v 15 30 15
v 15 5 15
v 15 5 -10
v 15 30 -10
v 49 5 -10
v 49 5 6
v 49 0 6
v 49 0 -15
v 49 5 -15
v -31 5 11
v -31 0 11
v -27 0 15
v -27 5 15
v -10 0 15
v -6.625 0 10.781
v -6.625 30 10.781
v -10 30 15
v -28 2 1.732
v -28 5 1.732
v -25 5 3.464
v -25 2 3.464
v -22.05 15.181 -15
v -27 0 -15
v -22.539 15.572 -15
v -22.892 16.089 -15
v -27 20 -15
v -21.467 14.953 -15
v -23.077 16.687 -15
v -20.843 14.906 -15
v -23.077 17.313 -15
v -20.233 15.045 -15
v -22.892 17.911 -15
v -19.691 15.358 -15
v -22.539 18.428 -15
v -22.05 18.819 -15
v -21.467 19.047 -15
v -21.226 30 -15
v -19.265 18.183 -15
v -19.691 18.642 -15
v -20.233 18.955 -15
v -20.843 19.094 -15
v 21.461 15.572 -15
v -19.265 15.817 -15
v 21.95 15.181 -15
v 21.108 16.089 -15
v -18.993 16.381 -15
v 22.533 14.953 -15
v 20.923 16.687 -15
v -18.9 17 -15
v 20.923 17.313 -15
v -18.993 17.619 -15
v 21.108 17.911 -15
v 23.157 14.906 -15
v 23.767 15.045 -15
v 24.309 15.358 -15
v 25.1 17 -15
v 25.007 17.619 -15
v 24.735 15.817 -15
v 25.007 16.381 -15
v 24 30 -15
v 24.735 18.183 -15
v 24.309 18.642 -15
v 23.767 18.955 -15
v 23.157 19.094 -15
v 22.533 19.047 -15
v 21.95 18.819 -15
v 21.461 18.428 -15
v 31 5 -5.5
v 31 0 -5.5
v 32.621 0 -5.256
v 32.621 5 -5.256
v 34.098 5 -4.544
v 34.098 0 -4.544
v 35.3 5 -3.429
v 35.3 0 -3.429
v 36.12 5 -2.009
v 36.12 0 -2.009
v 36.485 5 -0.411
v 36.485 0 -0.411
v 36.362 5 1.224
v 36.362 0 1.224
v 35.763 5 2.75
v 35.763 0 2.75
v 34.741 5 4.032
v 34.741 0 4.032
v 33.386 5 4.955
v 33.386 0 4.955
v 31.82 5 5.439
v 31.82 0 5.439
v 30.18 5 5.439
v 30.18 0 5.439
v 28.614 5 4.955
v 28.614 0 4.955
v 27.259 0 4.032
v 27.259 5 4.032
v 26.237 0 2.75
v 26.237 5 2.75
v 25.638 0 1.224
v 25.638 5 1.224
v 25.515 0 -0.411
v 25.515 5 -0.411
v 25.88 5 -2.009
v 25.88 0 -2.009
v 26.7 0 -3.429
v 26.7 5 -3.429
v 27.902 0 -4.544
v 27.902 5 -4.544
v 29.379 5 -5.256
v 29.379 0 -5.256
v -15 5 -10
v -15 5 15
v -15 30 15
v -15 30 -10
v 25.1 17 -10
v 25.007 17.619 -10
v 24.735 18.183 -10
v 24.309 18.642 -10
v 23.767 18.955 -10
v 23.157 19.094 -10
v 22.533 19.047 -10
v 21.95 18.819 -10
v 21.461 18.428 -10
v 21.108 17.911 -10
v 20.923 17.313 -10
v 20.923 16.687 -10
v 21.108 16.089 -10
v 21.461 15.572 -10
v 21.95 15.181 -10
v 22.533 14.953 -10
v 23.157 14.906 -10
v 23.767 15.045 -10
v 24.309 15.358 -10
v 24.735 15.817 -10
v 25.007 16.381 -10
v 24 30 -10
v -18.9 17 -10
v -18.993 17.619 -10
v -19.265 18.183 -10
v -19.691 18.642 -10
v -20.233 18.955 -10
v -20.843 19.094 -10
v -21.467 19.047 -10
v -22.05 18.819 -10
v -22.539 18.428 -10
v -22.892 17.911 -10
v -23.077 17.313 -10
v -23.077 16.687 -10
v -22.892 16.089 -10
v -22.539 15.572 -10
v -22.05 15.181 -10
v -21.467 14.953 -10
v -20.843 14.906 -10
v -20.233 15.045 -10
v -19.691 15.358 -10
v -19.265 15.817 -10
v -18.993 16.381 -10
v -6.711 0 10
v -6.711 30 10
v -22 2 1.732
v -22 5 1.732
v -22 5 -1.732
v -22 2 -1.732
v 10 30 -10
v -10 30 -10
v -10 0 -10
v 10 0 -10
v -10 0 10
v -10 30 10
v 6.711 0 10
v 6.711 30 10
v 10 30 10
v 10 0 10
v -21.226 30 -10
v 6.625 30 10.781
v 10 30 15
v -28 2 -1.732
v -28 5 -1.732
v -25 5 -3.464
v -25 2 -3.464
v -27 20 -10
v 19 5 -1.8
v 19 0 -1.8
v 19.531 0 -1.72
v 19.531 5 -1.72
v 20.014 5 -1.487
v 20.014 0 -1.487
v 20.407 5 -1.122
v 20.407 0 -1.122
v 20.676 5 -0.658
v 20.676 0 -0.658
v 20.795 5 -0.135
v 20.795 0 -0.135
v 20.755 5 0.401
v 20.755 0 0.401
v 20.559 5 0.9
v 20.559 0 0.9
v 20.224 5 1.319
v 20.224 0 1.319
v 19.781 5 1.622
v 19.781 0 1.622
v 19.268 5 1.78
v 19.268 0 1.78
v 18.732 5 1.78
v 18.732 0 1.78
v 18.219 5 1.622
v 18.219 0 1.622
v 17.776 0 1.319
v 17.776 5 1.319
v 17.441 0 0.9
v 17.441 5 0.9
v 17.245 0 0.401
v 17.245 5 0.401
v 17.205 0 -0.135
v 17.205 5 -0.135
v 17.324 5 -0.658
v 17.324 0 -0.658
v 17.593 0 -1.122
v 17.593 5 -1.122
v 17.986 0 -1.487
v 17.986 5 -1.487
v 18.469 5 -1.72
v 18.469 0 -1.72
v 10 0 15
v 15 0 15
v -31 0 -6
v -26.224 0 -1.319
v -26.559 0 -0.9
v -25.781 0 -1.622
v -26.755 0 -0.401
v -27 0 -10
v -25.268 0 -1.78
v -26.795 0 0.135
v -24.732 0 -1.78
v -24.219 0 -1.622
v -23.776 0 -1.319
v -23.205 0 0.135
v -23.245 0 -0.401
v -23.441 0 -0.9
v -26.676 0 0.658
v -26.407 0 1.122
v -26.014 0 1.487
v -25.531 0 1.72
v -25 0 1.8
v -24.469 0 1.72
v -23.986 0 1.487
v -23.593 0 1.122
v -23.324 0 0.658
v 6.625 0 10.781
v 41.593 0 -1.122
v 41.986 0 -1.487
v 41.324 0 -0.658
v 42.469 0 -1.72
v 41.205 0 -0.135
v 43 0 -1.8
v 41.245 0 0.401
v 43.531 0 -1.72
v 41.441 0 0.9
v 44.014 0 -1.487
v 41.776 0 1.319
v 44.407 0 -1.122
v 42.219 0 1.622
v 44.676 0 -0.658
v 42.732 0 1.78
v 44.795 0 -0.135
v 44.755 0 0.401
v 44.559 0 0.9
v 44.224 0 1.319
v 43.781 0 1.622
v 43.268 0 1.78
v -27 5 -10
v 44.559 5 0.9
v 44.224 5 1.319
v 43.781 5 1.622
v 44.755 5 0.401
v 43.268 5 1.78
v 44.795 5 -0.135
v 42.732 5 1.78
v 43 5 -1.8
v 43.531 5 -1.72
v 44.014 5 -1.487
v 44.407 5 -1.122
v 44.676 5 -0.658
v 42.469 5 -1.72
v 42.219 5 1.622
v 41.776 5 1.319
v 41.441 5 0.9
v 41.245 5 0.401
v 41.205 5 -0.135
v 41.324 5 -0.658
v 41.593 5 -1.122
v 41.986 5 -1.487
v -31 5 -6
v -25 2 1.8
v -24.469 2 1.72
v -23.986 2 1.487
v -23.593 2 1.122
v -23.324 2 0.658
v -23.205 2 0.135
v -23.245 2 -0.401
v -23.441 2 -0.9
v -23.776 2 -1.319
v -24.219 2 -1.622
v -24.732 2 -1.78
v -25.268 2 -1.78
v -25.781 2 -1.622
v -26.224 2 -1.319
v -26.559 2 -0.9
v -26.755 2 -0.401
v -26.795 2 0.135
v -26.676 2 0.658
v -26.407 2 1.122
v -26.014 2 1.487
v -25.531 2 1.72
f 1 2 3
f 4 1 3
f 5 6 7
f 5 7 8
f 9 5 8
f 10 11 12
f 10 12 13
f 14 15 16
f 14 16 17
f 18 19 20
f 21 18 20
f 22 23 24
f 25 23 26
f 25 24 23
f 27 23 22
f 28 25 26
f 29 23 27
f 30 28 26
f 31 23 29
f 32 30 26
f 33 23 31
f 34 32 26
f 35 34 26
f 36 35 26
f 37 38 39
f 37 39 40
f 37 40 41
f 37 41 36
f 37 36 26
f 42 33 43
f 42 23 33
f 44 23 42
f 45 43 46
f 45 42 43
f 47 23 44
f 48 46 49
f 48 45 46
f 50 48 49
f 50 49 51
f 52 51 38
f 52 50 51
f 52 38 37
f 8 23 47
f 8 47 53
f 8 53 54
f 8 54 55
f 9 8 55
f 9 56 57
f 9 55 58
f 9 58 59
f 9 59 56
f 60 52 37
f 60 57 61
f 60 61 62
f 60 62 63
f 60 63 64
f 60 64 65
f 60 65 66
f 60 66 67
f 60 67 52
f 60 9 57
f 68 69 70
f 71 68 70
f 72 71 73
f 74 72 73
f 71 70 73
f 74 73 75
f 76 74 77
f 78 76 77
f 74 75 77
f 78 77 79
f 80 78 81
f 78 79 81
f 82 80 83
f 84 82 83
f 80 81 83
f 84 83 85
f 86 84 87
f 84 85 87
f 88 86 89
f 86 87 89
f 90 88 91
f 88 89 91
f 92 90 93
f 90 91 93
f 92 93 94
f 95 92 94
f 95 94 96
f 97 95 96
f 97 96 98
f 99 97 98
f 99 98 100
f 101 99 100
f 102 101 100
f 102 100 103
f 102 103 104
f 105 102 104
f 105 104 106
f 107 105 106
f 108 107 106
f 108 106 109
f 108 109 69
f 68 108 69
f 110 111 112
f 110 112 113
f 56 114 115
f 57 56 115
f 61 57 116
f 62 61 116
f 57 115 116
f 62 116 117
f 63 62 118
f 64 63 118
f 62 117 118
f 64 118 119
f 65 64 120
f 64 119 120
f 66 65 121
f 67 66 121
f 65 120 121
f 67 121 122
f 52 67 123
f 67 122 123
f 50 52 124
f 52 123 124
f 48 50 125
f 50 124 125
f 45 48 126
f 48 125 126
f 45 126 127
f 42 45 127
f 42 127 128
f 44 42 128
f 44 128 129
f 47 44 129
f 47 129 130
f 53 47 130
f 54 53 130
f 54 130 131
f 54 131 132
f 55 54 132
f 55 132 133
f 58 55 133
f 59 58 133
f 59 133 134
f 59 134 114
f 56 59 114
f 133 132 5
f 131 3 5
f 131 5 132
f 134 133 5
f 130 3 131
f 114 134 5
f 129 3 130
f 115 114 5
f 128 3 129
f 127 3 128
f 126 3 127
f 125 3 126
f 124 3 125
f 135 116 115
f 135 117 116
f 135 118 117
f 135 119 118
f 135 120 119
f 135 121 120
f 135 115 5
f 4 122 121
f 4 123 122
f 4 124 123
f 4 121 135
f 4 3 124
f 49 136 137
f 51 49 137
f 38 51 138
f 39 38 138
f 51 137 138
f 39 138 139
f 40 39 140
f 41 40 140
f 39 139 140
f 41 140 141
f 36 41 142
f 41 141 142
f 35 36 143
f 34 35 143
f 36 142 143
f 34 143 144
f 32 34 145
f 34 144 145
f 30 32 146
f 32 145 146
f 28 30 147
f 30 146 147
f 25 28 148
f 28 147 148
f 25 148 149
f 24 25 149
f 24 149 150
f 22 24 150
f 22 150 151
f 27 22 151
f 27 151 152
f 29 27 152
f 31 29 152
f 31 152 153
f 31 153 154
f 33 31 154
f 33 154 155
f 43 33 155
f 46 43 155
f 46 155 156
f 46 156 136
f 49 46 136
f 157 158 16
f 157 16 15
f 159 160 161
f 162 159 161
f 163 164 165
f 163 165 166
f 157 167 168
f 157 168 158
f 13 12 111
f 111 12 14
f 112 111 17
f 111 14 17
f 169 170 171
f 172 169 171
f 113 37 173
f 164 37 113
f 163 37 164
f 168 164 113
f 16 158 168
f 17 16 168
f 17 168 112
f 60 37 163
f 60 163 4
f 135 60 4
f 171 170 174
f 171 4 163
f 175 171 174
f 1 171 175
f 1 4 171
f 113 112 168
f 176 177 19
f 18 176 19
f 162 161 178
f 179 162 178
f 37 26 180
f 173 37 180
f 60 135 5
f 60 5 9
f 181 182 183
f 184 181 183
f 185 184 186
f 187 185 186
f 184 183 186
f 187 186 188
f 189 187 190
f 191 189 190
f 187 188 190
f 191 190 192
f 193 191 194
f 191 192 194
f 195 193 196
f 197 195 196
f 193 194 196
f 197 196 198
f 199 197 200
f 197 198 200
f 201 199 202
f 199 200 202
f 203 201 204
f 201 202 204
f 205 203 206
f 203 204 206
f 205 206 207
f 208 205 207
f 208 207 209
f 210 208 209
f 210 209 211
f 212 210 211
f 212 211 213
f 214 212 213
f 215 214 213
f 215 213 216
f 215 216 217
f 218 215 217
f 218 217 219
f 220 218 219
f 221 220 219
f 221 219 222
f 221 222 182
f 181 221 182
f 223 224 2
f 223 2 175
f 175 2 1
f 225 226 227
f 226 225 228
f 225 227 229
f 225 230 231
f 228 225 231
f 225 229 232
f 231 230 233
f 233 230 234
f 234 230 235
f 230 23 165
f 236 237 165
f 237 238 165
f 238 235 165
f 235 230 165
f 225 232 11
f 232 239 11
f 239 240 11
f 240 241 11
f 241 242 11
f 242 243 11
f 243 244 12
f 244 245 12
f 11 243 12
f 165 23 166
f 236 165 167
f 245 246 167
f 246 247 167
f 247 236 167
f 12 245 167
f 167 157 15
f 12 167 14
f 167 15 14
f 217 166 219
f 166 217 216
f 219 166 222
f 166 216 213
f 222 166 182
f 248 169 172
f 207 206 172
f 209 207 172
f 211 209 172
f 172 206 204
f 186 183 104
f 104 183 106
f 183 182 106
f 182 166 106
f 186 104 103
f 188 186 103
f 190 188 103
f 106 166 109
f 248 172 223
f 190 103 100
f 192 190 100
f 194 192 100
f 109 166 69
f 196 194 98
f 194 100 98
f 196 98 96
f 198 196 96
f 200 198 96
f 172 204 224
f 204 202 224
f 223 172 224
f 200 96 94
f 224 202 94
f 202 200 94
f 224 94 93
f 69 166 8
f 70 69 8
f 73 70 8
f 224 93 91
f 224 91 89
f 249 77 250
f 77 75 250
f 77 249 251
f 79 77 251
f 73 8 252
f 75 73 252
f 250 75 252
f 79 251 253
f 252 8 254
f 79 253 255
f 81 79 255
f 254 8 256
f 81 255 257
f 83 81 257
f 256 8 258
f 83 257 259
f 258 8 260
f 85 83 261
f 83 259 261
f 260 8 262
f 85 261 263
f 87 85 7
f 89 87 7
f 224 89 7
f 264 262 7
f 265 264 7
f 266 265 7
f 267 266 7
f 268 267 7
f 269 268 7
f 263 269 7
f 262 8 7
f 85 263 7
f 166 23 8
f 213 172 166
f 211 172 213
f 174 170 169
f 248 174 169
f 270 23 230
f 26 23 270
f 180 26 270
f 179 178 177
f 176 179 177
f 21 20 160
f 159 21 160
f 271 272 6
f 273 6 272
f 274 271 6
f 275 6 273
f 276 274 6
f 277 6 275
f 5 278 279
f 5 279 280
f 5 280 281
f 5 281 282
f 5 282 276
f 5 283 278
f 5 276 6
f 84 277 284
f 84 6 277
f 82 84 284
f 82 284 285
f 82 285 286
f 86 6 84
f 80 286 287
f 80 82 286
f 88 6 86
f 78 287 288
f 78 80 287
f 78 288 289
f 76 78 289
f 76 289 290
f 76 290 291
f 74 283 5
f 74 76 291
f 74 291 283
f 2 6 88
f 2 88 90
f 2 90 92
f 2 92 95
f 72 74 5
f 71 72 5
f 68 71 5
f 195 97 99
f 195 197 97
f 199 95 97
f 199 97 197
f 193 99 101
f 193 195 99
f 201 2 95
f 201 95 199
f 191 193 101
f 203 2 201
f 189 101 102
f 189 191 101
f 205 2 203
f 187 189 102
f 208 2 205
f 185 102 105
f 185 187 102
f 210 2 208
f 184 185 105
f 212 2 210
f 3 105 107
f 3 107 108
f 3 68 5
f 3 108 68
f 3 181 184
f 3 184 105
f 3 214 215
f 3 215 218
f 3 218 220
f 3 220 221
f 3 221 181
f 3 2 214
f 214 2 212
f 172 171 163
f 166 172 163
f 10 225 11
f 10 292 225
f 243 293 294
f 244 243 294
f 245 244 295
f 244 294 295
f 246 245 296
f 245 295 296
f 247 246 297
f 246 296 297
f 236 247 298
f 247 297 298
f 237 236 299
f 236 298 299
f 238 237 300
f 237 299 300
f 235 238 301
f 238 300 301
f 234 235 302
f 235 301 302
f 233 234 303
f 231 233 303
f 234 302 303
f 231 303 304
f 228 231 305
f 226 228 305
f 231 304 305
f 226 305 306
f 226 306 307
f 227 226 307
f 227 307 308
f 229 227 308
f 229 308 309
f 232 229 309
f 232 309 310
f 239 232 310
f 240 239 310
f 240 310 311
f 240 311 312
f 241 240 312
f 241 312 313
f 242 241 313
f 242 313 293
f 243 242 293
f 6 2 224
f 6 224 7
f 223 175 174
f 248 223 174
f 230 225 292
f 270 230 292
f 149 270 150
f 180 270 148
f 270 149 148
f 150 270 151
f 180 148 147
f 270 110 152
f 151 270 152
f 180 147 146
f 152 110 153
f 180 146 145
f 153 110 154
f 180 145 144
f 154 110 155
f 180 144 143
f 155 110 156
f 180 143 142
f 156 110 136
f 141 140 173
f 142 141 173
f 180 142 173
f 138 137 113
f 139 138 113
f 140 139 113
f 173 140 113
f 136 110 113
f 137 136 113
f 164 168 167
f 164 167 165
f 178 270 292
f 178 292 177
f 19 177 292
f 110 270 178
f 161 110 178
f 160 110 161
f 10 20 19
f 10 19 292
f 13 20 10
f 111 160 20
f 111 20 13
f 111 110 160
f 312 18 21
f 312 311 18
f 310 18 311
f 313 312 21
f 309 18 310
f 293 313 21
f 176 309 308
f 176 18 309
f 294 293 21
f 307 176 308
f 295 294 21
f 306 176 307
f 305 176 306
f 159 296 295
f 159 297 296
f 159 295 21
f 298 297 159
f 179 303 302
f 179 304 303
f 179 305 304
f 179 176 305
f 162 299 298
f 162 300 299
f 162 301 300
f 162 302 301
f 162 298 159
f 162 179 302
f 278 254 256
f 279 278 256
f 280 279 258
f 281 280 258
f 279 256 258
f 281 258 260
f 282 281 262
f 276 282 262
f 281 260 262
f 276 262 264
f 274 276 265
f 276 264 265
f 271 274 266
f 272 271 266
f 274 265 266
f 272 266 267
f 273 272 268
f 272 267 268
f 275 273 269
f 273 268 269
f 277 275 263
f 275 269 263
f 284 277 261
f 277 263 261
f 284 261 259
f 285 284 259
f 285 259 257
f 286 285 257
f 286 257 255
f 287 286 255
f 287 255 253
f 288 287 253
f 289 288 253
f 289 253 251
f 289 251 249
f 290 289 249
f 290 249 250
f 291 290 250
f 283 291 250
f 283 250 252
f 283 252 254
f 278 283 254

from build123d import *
from OCP.BRepFilletAPI import BRepFilletAPI_MakeChamfer

# Parameters (mm, degrees)
SKETCH1_W           = 30
SKETCH1_H           = 30
BOSS_EXTRUDE1_DEPTH = 30
SKETCH2_W           = 20
SKETCH2_H           = 20
CUT_EXTRUDE1_DEPTH  = 37.742346142
SKETCH3_W           = 30
SKETCH3_H           = 5
BOSS_EXTRUDE2_DEPTH = 40
SKETCH4_R           = 5.5
SKETCH4_R_2         = 1.8
CUT_EXTRUDE2_DEPTH  = 65.420493634
CUT_EXTRUDE3_DEPTH  = 63.24949799
SKETCH5_W           = 5
SKETCH5_H           = 25
BOSS_EXTRUDE4_DEPTH = 34
CHAMFER1_SIZE       = 25
SKETCH8_R           = 2.1
CUT_EXTRUDE4_DEPTH  = 63.657800791
SKETCH9_W           = 5
SKETCH9_H           = 30
BOSS_EXTRUDE5_DEPTH = 12
CHAMFER2_SIZE       = 10
CHAMFER2_SIZE2      = 5.773502692
SKETCH10_R          = 2.1
CUT_EXTRUDE5_DEPTH  = 63.657800791
SKETCH11_W          = 25
SKETCH11_H          = 5
BOSS_EXTRUDE6_DEPTH = 16
CHAMFER3_SIZE       = 4
SKETCH12_R          = 1.8
CUT_EXTRUDE6_DEPTH  = 58.017541161
CUT_EXTRUDE7_DEPTH  = 3
CUT_EXTRUDE8_DEPTH  = 60.380131357
CHAMFER4_SIZE       = 1
CHAMFER4_SIZE2      = 0.711458249


with BuildPart() as part:
    # Sketch1 → Boss-Extrude1 (new body)
    with BuildSketch(Plane(origin=(0, 0, 0), x_dir=(1, 0, 0), z_dir=(0, 1, 0))):
        Rectangle(SKETCH1_W, SKETCH1_H)
    extrude(amount=BOSS_EXTRUDE1_DEPTH)

    # Sketch2 → Cut-Extrude1 (cut, through all)
    with BuildSketch(Plane(origin=(0, 30, 0), x_dir=(1, 0, 0), z_dir=(0, 1, 0))):
        Rectangle(SKETCH2_W, SKETCH2_H)
    extrude(amount=-CUT_EXTRUDE1_DEPTH, mode=Mode.SUBTRACT)

    # Sketch3 → Boss-Extrude2 (add)
    with BuildSketch(Plane(origin=(15, 0, 0), x_dir=(0, 0, -1), z_dir=(1, 0, 0))):
        with Locations((0, 2.5)):
            Rectangle(SKETCH3_W, SKETCH3_H)
    extrude(amount=BOSS_EXTRUDE2_DEPTH)

    # Sketch4 → Cut-Extrude2 (cut, through all)
    with BuildSketch(Plane.XZ):
        with Locations(Location((31, 0, 0), (0, 0, 270))):
            Circle(SKETCH4_R)
        with Locations(Location((19, 0, 0), (0, 0, 270))):
            Circle(SKETCH4_R_2)
        with Locations(Location((43, 0, 0), (0, 0, 270))):
            Circle(SKETCH4_R_2)
    extrude(amount=-CUT_EXTRUDE2_DEPTH, mode=Mode.SUBTRACT)

    # Sketch7 → Cut-Extrude3 (cut, through all)
    with BuildSketch(Plane(origin=(0, 5, 0), x_dir=(1, 0, 0), z_dir=(0, 1, 0))):
        Polygon((15, -15), (49, -6), (49, 15), (55, 15), (55, -15), align=None)
    extrude(amount=-CUT_EXTRUDE3_DEPTH, mode=Mode.SUBTRACT)

    # Sketch5 → Boss-Extrude4 (add)
    with BuildSketch(Plane(origin=(15, 0, 0), x_dir=(0, 0, -1), z_dir=(1, 0, 0))):
        with Locations((12.5, 17.5)):
            Rectangle(SKETCH5_W, SKETCH5_H)
    extrude(amount=BOSS_EXTRUDE4_DEPTH)

    # Chamfer1
    chamfer1_edges = [part.edges().sort_by_distance(p)[0] for p in [
        (49, 30, -12.5),
    ]]
    chamfer(chamfer1_edges, length=CHAMFER1_SIZE)

    # Sketch8 → Cut-Extrude4 (cut, through all)
    with BuildSketch(Plane.XY.offset(-10)):
        with Locations((23, 17)):
            Circle(SKETCH8_R)
    extrude(amount=-CUT_EXTRUDE4_DEPTH, mode=Mode.SUBTRACT)

    # Sketch9 → Boss-Extrude5 (add)
    with BuildSketch(Plane.ZY.offset(15)):
        with Locations((-12.5, 15)):
            Rectangle(SKETCH9_W, SKETCH9_H)
    extrude(amount=BOSS_EXTRUDE5_DEPTH)

    # Chamfer2
    chamfer2_edges = [part.edges().sort_by_distance(p)[0] for p in [
        (-27, 30, -12.5),
    ]]
    chamfer2_side = [part.faces().sort_by_distance(p)[0] for p in [
        (-27, 15, -12.5),
    ]]
    chamfer(chamfer2_edges, length=CHAMFER2_SIZE, length2=CHAMFER2_SIZE2, reference=chamfer2_side[0])

    # Sketch10 → Cut-Extrude5 (cut, through all)
    with BuildSketch(Plane.XY.offset(-10)):
        with Locations((-21, 17)):
            Circle(SKETCH10_R)
    extrude(amount=-CUT_EXTRUDE5_DEPTH, mode=Mode.SUBTRACT)

    # Sketch11 → Boss-Extrude6 (add)
    with BuildSketch(Plane.ZY.offset(15)):
        with Locations((2.5, 2.5)):
            Rectangle(SKETCH11_W, SKETCH11_H)
    extrude(amount=BOSS_EXTRUDE6_DEPTH)

    # Chamfer3
    chamfer3_edges = [part.edges().sort_by_distance(p)[0] for p in [
        (-31, 2.5, 15),
        (-31, 2.5, -10),
    ]]
    chamfer(chamfer3_edges, length=CHAMFER3_SIZE - 0.0001)  # a hair under: the kernel refuses the full size

    # Sketch12 → Cut-Extrude6 (cut, through all)
    with BuildSketch(Plane(origin=(0, 5, 0), x_dir=(1, 0, 0), z_dir=(0, 1, 0))):
        with Locations(Location((-25, 0, 0), (0, 0, 270))):
            Circle(SKETCH12_R)
    extrude(amount=-CUT_EXTRUDE6_DEPTH, mode=Mode.SUBTRACT)

    # Sketch13 → Cut-Extrude7 (cut)
    with BuildSketch(Plane(origin=(0, 5, 0), x_dir=(1, 0, 0), z_dir=(0, 1, 0))):
        Polygon((-25, -3.464101615), (-22, -1.732050808), (-22, 1.732050808), (-25, 3.464101615), (-28, 1.732050808), (-28, -1.732050808), align=None)
    extrude(amount=-CUT_EXTRUDE7_DEPTH, mode=Mode.SUBTRACT)

    # Sketch14 → Cut-Extrude8 (cut, through all)
    with BuildSketch(Plane(origin=(0, 30, 0), x_dir=(1, 0, 0), z_dir=(0, 1, 0))):
        Polygon((-6, -10), (-10, -15), (10, -15), (6, -10), align=None)
    extrude(amount=-CUT_EXTRUDE8_DEPTH, mode=Mode.SUBTRACT)

    # Chamfer4: one chamfer whose edges measure the first distance from different faces: ONE call of the kernel's chamfer builder (chamfer() names one face for all edges)
    chamfer4_edges_1 = [part.edges().sort_by_distance(p)[0] for p in [
        (-6, 15, 10),
    ]]
    chamfer4_side_1 = [part.faces().sort_by_distance(p)[0] for p in [
        (-8, 15, 12.5),
    ]]
    chamfer4_edges_2 = [part.edges().sort_by_distance(p)[0] for p in [
        (6, 15, 10),
    ]]
    chamfer4_side_2 = [part.faces().sort_by_distance(p)[0] for p in [
        (8, 15, 12.5),
    ]]
    chamfer4 = BRepFilletAPI_MakeChamfer(part.part.solid().wrapped)
    for e in chamfer4_edges_1:
        chamfer4.Add(CHAMFER4_SIZE, CHAMFER4_SIZE2, e.wrapped, chamfer4_side_1[0].wrapped)  # the first distance lies on this face
    for e in chamfer4_edges_2:
        chamfer4.Add(CHAMFER4_SIZE, CHAMFER4_SIZE2, e.wrapped, chamfer4_side_2[0].wrapped)  # the first distance lies on this face
    add(Compound.cast(chamfer4.Shape()), mode=Mode.REPLACE)


solid = part.part
